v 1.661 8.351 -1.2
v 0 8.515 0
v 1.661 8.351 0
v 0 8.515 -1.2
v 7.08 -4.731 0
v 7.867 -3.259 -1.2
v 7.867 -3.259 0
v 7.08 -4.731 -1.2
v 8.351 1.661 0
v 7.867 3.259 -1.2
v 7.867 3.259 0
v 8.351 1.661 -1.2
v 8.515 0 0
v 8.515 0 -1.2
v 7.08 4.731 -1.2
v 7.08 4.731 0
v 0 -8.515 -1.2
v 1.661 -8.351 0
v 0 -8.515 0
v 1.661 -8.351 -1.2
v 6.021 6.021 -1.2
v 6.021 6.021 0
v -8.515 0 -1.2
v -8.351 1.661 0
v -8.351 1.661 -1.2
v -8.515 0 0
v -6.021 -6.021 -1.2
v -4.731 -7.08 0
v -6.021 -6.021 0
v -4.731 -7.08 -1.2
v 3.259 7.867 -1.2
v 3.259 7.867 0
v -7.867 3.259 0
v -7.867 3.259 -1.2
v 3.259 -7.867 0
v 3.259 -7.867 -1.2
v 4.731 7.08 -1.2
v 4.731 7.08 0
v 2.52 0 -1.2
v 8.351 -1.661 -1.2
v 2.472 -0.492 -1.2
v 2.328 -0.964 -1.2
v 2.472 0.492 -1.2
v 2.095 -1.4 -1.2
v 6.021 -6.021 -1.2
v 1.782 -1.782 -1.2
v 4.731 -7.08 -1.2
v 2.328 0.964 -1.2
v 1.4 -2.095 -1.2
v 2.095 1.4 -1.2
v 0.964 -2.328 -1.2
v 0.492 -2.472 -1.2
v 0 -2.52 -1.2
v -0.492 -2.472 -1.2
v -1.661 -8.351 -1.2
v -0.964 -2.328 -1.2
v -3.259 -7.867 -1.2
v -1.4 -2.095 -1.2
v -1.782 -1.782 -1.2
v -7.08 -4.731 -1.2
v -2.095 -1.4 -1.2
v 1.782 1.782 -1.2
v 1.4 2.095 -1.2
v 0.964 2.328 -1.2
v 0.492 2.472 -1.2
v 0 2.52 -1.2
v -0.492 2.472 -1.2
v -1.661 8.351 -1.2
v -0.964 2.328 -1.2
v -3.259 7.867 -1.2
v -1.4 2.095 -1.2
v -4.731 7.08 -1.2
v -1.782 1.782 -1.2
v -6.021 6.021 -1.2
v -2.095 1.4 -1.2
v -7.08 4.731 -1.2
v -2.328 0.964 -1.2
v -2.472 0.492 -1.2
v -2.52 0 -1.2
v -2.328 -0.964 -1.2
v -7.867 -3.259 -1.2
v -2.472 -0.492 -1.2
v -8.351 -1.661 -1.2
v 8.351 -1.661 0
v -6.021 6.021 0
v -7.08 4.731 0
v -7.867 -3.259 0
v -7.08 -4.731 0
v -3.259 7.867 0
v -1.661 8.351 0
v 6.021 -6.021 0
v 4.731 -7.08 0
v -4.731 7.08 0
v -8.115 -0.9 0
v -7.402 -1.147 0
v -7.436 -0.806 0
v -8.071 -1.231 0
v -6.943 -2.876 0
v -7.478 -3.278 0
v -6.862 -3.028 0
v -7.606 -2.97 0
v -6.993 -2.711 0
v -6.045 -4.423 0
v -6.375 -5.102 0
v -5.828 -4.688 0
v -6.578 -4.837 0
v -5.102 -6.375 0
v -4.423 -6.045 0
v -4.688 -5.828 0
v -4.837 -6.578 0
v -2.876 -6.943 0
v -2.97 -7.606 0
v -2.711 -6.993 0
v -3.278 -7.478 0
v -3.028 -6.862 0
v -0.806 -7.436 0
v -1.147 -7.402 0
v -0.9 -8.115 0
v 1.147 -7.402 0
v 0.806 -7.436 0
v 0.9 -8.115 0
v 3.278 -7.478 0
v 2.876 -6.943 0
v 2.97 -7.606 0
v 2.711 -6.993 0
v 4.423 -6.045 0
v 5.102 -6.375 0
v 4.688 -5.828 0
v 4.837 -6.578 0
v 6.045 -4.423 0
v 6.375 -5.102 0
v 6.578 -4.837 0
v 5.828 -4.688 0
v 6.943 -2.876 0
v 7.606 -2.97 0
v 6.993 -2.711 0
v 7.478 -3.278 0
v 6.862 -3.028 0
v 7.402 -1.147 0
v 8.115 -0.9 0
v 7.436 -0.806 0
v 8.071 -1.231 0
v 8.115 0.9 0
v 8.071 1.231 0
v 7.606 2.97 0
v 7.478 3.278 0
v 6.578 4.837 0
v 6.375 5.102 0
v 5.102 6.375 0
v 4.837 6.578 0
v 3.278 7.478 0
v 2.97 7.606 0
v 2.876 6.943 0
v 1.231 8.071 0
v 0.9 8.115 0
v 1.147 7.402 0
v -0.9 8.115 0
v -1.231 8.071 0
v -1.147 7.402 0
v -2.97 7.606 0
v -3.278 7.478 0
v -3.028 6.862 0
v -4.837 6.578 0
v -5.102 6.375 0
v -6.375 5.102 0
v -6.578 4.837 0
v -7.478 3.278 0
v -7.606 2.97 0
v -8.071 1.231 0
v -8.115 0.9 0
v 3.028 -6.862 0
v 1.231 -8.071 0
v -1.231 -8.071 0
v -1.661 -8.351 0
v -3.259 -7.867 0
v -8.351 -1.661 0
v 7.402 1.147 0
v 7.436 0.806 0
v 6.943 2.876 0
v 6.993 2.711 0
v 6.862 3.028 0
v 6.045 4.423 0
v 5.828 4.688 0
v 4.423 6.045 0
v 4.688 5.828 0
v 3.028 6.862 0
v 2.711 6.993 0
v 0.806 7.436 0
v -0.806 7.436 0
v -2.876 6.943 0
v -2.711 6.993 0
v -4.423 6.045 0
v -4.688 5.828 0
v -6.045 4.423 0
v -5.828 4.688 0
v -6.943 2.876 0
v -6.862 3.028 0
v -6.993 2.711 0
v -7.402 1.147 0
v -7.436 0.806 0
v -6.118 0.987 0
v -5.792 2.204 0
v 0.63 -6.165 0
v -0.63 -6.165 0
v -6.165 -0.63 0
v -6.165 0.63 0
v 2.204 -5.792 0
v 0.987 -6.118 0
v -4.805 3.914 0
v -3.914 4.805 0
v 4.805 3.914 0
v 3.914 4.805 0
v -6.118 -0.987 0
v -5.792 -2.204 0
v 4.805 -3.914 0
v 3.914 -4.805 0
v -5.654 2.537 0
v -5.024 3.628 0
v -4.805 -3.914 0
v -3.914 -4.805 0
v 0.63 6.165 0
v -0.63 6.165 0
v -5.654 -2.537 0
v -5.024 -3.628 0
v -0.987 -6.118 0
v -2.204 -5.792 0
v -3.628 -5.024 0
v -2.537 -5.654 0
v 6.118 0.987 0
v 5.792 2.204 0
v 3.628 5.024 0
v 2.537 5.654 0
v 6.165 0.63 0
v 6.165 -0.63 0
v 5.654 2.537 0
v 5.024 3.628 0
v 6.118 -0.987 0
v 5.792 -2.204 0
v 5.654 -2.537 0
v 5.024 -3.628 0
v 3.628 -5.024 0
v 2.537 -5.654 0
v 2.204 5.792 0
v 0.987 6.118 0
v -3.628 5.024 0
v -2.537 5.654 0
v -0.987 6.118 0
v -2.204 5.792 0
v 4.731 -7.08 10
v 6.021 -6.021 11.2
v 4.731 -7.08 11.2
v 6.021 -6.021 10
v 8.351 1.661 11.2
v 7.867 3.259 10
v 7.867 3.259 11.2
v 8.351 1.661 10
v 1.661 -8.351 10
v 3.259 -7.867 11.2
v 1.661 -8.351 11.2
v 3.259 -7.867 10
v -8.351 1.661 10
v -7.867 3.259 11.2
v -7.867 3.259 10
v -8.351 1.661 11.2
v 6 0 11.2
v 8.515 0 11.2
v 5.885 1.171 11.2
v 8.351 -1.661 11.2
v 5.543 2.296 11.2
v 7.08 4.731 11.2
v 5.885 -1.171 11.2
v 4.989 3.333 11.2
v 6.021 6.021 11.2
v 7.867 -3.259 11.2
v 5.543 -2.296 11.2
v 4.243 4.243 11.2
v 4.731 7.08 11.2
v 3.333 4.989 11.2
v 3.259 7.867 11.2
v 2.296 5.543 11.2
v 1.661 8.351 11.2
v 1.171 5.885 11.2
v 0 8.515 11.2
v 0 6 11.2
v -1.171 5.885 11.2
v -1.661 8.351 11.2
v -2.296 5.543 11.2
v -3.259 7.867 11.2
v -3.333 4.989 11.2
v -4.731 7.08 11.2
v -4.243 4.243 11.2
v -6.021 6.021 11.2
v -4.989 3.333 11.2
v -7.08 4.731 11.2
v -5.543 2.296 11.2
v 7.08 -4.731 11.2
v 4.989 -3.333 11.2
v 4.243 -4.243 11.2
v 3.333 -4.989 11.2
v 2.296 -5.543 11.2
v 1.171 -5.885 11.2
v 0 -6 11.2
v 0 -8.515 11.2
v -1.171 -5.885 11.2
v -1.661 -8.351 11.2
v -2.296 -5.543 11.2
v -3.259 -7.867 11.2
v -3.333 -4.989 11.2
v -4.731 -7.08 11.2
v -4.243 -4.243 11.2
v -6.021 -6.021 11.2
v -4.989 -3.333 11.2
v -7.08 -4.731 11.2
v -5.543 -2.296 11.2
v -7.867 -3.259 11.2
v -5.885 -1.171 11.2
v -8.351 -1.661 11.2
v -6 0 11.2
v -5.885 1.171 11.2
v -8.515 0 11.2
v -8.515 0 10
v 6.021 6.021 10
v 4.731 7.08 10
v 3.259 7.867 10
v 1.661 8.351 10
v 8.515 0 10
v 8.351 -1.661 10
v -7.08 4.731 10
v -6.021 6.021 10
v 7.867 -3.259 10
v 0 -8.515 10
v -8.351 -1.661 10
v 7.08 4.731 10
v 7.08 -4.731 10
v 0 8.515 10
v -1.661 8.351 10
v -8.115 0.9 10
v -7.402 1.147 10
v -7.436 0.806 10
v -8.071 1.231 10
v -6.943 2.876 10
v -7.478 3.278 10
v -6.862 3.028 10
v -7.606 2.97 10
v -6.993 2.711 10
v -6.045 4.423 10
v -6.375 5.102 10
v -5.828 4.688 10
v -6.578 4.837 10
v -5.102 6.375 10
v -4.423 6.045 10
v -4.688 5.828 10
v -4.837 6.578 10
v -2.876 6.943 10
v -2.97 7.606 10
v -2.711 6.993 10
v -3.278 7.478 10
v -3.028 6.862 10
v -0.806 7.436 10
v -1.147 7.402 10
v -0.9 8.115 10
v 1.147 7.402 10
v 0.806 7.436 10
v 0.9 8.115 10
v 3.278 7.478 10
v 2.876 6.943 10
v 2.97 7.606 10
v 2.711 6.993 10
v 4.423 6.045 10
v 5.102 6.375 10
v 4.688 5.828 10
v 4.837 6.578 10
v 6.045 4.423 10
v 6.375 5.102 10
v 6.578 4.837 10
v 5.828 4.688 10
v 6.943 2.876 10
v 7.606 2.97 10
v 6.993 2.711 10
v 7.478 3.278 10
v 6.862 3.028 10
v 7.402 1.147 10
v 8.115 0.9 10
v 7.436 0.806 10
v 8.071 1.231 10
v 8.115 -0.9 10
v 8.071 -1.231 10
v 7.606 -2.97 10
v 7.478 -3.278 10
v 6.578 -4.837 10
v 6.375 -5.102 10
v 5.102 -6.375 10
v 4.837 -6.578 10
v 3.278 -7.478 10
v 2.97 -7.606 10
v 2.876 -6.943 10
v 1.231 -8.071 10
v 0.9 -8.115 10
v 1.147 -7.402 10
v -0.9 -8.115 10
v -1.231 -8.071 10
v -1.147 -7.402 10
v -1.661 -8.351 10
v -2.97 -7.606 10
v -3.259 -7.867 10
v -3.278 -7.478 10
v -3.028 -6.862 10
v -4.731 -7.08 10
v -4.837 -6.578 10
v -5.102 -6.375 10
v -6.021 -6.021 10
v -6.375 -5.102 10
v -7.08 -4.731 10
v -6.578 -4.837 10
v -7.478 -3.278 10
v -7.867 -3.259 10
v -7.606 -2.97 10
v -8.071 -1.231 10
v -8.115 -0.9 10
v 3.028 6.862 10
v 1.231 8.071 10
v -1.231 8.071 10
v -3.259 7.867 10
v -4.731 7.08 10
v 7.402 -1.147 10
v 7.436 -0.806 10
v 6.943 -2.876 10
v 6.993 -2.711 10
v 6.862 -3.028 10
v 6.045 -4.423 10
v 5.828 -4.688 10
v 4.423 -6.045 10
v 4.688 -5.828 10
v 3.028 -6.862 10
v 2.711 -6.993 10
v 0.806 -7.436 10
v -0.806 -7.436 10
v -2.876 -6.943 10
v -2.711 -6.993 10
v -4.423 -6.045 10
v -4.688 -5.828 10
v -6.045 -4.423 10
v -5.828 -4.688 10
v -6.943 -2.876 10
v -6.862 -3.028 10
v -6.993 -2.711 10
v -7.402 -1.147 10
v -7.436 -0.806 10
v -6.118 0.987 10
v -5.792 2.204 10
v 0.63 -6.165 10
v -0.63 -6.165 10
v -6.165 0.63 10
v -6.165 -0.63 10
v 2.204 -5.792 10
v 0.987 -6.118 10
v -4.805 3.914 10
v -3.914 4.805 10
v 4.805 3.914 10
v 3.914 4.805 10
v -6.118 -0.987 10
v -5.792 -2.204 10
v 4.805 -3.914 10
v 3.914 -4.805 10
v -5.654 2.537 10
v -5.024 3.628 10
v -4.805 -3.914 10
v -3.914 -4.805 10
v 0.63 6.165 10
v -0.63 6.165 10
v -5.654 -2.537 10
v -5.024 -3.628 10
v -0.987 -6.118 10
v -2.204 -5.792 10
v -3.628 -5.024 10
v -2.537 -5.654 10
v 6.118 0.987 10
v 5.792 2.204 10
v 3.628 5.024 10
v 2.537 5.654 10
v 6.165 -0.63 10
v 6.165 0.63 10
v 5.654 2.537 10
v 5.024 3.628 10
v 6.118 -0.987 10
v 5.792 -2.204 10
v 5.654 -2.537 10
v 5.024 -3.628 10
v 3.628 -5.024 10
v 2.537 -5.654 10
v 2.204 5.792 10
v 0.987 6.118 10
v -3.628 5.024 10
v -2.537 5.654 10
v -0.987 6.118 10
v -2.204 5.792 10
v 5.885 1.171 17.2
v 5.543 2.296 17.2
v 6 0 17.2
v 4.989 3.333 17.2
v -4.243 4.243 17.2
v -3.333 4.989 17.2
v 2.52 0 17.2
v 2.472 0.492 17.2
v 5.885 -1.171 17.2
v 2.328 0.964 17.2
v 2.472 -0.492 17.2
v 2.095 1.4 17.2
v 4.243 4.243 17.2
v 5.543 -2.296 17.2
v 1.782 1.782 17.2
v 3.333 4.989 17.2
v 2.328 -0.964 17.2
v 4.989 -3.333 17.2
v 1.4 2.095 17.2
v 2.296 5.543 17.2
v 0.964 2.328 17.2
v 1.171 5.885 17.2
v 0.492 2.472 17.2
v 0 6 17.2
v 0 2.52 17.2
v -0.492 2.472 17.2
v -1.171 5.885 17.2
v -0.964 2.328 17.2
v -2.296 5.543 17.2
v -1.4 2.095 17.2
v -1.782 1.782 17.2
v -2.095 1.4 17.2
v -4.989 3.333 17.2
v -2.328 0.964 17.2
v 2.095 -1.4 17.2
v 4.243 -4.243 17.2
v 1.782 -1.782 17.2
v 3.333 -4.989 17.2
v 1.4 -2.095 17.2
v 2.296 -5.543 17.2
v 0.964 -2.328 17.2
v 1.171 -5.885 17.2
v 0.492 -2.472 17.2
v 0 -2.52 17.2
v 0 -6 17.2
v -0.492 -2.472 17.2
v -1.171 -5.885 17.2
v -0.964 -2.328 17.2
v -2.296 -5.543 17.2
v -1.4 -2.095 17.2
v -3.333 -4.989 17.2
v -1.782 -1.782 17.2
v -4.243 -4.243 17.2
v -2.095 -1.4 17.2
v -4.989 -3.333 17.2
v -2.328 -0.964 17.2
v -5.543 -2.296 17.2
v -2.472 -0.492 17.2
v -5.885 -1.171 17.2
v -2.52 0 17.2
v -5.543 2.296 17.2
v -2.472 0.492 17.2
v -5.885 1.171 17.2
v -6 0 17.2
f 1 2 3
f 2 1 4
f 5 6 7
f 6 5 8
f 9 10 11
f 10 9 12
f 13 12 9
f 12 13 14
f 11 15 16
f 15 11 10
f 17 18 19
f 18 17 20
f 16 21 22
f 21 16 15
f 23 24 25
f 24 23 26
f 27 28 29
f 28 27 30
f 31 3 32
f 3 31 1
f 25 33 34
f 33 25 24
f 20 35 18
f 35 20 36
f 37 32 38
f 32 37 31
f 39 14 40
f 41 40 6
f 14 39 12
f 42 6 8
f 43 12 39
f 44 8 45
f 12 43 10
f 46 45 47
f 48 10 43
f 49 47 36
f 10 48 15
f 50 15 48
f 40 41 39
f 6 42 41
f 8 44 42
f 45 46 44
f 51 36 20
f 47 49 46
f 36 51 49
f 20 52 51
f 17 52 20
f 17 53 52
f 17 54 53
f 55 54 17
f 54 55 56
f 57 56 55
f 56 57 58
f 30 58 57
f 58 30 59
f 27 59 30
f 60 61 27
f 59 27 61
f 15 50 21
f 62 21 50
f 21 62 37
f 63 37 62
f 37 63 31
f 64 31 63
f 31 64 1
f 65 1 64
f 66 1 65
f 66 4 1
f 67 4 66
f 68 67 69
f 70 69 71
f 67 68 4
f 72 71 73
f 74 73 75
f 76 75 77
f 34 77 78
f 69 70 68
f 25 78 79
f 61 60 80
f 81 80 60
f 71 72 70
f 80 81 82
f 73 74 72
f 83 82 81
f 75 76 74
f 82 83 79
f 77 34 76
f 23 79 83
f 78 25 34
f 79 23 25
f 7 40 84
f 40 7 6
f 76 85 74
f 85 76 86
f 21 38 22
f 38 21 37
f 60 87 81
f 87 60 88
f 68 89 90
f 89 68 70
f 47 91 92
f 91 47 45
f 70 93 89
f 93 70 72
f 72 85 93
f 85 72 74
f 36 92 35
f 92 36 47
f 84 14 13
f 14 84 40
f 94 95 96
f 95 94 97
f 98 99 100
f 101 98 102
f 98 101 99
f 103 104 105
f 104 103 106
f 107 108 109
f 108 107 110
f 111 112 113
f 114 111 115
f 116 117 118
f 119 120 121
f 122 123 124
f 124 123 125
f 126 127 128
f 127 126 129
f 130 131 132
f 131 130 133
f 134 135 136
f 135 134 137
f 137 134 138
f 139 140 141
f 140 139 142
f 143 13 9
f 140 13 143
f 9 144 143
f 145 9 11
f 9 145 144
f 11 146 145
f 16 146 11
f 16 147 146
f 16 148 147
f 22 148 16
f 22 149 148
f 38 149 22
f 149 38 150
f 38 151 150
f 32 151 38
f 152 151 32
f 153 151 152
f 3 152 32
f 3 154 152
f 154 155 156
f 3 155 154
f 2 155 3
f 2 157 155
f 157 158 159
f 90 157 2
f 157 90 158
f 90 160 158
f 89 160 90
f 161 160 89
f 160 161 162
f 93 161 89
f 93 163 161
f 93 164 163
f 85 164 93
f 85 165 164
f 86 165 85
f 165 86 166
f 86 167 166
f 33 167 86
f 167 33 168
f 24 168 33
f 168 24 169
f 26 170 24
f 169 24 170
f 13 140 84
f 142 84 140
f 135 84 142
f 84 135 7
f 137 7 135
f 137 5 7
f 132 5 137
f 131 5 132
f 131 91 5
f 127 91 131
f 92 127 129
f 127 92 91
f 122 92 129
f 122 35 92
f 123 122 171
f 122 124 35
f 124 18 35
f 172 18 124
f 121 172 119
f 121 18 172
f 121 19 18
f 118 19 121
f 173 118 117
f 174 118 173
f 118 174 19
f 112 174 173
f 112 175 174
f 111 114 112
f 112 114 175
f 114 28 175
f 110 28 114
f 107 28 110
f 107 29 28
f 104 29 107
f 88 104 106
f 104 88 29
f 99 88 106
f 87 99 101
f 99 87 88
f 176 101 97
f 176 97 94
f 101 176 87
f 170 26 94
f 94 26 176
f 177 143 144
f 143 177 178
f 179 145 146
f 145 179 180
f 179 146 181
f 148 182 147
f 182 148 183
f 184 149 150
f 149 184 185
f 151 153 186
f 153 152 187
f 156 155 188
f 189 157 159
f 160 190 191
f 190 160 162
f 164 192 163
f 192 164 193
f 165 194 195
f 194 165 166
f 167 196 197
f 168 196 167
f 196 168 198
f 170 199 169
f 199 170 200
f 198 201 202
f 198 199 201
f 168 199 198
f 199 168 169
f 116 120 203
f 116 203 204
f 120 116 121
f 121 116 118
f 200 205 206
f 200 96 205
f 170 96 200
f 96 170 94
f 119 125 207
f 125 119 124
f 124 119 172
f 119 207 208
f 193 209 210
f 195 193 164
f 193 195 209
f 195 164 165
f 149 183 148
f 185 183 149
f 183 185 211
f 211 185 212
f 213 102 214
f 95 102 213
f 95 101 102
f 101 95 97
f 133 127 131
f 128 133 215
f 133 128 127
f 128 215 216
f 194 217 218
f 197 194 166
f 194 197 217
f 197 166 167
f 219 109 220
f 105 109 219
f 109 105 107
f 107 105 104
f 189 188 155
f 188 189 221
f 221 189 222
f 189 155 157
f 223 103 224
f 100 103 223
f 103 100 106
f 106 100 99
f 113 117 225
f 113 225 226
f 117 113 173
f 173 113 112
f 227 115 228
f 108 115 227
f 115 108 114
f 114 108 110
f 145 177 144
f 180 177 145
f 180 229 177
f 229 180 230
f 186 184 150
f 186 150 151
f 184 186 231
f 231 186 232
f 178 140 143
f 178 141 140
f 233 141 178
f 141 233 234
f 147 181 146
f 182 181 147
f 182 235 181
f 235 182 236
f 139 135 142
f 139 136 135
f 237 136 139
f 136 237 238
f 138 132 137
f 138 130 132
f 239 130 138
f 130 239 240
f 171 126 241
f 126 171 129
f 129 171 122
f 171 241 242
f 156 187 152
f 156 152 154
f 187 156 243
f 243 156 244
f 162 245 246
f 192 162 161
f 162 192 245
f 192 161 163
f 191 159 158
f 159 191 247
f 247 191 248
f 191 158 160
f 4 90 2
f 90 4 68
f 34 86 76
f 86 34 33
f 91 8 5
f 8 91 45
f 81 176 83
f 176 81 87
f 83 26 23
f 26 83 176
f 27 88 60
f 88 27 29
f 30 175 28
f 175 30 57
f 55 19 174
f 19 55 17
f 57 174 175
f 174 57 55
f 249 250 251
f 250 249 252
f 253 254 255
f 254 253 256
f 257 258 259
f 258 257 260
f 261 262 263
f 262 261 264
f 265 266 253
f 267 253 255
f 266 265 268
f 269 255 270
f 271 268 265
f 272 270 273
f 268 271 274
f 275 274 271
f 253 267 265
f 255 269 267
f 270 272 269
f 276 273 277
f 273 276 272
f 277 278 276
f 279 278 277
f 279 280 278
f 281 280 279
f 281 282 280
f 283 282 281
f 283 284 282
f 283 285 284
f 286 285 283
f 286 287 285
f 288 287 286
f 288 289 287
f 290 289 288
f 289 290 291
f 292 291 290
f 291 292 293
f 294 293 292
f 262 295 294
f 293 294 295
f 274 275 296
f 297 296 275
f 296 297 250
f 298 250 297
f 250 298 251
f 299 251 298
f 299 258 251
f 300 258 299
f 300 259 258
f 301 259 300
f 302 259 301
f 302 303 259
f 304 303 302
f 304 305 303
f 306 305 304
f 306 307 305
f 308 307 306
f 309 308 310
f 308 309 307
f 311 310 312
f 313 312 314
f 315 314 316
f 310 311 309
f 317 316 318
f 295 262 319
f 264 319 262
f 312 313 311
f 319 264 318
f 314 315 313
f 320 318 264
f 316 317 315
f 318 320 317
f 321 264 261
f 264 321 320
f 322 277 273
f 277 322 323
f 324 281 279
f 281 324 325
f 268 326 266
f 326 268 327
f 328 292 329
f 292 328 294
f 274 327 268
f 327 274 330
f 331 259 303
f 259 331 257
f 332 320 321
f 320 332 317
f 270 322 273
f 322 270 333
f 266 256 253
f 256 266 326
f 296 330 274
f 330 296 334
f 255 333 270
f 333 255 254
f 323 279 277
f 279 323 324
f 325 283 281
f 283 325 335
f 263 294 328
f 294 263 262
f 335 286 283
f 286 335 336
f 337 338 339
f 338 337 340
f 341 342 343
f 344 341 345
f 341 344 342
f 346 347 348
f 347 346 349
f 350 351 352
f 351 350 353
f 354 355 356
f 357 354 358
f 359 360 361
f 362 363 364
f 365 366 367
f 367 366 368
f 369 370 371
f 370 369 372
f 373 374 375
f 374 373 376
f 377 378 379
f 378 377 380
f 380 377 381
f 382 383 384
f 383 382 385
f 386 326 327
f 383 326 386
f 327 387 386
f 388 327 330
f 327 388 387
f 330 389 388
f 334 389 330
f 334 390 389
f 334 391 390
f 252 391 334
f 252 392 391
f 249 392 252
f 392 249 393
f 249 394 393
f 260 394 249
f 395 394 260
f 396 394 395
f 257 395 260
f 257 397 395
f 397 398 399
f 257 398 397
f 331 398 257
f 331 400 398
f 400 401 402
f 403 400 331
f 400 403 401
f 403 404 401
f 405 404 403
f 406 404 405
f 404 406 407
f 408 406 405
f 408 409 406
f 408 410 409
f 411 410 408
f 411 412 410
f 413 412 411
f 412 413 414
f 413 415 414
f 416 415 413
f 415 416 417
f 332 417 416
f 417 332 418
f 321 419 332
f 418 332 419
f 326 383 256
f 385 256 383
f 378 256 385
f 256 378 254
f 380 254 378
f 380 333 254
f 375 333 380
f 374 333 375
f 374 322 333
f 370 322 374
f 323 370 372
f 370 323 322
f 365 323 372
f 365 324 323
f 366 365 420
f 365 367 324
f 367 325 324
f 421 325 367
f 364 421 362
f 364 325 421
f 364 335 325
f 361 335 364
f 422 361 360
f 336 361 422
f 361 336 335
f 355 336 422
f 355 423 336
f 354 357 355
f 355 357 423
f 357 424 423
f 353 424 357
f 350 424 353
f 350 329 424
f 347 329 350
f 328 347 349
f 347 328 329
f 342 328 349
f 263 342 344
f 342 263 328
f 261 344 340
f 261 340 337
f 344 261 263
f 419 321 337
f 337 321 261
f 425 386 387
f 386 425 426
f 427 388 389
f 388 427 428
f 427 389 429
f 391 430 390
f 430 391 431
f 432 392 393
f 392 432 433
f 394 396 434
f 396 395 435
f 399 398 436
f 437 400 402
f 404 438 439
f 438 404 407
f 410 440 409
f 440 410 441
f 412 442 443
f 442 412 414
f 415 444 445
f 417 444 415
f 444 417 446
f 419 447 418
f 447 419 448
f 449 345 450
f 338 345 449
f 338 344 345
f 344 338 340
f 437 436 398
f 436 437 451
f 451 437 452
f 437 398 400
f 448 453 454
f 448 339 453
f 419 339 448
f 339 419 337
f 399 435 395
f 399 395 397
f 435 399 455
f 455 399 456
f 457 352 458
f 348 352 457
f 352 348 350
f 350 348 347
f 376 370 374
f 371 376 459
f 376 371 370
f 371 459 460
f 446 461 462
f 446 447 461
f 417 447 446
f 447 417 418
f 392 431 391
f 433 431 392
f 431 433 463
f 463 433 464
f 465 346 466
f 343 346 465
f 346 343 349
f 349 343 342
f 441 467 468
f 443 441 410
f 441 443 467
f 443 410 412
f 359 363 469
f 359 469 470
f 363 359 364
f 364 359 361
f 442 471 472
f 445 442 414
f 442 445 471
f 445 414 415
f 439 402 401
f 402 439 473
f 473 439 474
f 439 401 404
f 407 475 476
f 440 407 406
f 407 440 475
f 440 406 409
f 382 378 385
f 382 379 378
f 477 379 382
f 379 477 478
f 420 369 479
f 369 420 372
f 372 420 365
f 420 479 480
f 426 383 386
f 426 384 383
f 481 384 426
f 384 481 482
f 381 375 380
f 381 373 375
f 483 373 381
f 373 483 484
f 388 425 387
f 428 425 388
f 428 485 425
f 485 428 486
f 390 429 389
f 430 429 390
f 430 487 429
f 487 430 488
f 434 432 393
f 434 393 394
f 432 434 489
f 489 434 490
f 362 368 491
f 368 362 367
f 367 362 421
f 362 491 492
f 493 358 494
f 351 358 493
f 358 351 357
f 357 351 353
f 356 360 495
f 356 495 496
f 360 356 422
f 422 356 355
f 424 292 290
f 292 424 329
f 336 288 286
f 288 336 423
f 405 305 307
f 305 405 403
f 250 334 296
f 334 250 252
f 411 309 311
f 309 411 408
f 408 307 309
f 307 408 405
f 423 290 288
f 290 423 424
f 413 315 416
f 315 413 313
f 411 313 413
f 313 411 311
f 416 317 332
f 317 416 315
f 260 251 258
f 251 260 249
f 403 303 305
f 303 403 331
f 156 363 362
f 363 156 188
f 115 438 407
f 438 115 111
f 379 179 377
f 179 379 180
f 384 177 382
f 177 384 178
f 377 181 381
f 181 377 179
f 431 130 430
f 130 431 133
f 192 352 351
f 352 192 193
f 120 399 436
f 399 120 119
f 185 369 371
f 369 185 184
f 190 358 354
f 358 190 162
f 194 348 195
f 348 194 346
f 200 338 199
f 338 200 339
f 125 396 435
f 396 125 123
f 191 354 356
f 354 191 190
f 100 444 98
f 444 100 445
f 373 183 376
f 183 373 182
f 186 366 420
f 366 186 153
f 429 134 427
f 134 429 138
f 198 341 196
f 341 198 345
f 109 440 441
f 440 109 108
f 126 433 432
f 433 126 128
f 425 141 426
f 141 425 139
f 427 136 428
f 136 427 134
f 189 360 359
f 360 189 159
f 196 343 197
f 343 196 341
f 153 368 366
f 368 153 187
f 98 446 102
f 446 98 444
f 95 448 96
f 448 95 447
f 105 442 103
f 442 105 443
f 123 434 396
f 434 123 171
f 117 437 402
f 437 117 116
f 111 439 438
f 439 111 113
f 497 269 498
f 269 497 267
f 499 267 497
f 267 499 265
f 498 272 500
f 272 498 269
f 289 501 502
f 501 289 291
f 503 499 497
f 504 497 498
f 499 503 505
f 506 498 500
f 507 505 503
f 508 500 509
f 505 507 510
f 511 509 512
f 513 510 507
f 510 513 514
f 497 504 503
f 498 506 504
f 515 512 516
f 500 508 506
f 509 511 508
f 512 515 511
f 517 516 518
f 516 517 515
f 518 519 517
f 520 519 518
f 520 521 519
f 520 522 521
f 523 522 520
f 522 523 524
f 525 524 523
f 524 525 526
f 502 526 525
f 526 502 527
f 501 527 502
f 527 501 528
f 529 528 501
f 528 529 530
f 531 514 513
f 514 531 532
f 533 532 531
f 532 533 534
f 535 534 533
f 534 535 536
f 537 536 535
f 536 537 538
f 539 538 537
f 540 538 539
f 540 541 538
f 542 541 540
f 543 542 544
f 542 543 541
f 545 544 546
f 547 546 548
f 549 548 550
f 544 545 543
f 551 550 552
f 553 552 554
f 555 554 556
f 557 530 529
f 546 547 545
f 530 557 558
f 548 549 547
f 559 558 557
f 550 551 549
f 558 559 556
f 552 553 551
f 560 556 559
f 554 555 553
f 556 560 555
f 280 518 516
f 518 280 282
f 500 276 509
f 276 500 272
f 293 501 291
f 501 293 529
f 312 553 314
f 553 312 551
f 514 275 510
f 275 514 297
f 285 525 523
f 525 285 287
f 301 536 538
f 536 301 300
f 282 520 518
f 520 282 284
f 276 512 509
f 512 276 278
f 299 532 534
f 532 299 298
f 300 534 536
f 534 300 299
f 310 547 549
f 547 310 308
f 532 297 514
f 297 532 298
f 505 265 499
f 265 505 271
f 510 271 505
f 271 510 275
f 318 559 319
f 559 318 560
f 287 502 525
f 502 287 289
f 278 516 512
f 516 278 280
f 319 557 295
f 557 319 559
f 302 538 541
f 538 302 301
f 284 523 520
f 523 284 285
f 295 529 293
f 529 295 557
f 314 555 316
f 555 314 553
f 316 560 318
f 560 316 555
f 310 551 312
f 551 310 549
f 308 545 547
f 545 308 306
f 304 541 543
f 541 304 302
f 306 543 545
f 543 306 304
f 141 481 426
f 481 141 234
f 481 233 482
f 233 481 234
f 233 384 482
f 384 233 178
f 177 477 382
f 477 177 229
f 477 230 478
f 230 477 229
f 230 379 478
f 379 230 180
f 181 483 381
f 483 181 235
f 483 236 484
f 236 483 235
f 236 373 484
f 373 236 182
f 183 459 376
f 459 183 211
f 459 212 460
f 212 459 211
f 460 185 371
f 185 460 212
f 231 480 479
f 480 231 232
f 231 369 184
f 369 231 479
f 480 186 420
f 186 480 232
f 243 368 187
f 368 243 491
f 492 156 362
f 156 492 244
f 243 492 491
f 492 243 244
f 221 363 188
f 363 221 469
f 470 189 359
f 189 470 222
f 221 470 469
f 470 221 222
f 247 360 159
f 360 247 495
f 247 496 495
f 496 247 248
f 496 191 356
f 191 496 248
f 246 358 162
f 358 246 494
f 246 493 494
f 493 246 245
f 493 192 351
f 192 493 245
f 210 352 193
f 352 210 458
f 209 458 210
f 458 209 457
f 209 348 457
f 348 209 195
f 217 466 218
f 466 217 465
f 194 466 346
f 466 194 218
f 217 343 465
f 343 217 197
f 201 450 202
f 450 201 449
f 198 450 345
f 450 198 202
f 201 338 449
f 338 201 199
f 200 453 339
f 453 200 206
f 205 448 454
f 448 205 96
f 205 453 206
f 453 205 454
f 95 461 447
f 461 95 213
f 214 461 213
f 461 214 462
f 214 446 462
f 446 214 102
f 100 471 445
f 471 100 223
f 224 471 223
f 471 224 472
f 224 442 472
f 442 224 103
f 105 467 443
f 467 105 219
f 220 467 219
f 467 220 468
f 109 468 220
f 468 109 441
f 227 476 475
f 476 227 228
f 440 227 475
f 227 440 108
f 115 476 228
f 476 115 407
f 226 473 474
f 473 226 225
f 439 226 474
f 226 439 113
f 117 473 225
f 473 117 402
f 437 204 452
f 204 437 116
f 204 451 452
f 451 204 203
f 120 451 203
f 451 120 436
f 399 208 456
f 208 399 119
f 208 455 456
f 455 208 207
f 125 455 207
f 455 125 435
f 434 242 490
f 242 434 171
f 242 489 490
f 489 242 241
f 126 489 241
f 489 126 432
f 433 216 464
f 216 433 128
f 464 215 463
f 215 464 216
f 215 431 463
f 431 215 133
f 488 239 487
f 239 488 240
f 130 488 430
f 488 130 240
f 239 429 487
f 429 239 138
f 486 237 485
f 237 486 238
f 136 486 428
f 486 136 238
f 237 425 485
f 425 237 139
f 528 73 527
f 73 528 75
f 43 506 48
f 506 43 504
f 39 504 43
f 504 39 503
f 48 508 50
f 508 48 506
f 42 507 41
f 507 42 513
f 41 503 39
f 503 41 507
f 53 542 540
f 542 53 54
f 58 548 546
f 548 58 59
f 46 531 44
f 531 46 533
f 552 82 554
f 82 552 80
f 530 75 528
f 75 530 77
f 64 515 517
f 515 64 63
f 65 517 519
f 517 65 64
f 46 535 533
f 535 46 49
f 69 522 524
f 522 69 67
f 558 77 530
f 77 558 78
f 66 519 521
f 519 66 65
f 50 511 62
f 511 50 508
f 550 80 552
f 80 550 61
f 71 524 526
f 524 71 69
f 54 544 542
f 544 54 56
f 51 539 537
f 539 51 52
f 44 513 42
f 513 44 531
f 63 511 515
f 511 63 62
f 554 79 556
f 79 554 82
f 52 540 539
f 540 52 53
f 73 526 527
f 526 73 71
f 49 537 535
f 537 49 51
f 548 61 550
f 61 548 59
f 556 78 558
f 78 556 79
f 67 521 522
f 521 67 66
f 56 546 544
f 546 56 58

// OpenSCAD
$fn = 32;

// ----------------------------------------------------------------------
// Timing pulley: GT2 24T, pitch 2 mm, 17.03 mm x 18.4 mm
// ----------------------------------------------------------------------

// --- parameters (mm) ---
pitch_mm = 2;             // belt pitch
tooth_count = 24;         // number of grooves
width = 10;               // belt width between the flanges
tip_d = 15.03;            // tip circle diameter
root_d = 13.53;           // groove bottom diameter
groove_h = 0.75;          // groove depth
tooth_w = 1.5;            // groove width at the tip circle
side_d = 17.03;           // flange diameter
side_t = 1.2;             // flange thickness
spigot_d = 11.93;         // flange spigot, sunk into the rim
spigot_h = 1.2;           // spigot depth into the rim
hub_bore = 5.04;          // shaft bore
hub_d = 12;               // hub diameter
hub_h = 6;                // hub above the flange
bottom_z = -1.2;          // lowest point of the pulley
top_z = 17.2;             // highest point of the pulley

module rim() {
  cylinder(h = width, d = tip_d);
}

module groove_cutter() {
  /* belt tooth groove: deeper than wide, cut through the belt width */
  translate([root_d / 2, 0, 0])
    linear_extrude(height = width)
      polygon(points = [[-0.6, -tooth_w * 0.42], [groove_h + 0.6, -tooth_w * 0.6],
                        [groove_h + 0.6, tooth_w * 0.6], [-0.6, tooth_w * 0.42]]);
}

module flanges() {
  translate([0, 0, -side_t]) cylinder(h = side_t, d = side_d);
  translate([0, 0, width]) cylinder(h = side_t, d = side_d);
  translate([0, 0, -spigot_h]) cylinder(h = spigot_h + 0.6, d = spigot_d);
  translate([0, 0, width - 0.6]) cylinder(h = spigot_h + 0.6, d = spigot_d);
}

module hub() {
  translate([0, 0, bottom_z]) cylinder(h = top_z - bottom_z, d = hub_d);
}

difference() {
  union() {
    rim();
    hub();
    flanges();
  }
  for (i = [0 : tooth_count - 1]) rotate([0, 0, i * 360 / tooth_count]) groove_cutter();
  translate([0, 0, bottom_z - 1]) cylinder(h = top_z - bottom_z + 2, d = hub_bore);
}
